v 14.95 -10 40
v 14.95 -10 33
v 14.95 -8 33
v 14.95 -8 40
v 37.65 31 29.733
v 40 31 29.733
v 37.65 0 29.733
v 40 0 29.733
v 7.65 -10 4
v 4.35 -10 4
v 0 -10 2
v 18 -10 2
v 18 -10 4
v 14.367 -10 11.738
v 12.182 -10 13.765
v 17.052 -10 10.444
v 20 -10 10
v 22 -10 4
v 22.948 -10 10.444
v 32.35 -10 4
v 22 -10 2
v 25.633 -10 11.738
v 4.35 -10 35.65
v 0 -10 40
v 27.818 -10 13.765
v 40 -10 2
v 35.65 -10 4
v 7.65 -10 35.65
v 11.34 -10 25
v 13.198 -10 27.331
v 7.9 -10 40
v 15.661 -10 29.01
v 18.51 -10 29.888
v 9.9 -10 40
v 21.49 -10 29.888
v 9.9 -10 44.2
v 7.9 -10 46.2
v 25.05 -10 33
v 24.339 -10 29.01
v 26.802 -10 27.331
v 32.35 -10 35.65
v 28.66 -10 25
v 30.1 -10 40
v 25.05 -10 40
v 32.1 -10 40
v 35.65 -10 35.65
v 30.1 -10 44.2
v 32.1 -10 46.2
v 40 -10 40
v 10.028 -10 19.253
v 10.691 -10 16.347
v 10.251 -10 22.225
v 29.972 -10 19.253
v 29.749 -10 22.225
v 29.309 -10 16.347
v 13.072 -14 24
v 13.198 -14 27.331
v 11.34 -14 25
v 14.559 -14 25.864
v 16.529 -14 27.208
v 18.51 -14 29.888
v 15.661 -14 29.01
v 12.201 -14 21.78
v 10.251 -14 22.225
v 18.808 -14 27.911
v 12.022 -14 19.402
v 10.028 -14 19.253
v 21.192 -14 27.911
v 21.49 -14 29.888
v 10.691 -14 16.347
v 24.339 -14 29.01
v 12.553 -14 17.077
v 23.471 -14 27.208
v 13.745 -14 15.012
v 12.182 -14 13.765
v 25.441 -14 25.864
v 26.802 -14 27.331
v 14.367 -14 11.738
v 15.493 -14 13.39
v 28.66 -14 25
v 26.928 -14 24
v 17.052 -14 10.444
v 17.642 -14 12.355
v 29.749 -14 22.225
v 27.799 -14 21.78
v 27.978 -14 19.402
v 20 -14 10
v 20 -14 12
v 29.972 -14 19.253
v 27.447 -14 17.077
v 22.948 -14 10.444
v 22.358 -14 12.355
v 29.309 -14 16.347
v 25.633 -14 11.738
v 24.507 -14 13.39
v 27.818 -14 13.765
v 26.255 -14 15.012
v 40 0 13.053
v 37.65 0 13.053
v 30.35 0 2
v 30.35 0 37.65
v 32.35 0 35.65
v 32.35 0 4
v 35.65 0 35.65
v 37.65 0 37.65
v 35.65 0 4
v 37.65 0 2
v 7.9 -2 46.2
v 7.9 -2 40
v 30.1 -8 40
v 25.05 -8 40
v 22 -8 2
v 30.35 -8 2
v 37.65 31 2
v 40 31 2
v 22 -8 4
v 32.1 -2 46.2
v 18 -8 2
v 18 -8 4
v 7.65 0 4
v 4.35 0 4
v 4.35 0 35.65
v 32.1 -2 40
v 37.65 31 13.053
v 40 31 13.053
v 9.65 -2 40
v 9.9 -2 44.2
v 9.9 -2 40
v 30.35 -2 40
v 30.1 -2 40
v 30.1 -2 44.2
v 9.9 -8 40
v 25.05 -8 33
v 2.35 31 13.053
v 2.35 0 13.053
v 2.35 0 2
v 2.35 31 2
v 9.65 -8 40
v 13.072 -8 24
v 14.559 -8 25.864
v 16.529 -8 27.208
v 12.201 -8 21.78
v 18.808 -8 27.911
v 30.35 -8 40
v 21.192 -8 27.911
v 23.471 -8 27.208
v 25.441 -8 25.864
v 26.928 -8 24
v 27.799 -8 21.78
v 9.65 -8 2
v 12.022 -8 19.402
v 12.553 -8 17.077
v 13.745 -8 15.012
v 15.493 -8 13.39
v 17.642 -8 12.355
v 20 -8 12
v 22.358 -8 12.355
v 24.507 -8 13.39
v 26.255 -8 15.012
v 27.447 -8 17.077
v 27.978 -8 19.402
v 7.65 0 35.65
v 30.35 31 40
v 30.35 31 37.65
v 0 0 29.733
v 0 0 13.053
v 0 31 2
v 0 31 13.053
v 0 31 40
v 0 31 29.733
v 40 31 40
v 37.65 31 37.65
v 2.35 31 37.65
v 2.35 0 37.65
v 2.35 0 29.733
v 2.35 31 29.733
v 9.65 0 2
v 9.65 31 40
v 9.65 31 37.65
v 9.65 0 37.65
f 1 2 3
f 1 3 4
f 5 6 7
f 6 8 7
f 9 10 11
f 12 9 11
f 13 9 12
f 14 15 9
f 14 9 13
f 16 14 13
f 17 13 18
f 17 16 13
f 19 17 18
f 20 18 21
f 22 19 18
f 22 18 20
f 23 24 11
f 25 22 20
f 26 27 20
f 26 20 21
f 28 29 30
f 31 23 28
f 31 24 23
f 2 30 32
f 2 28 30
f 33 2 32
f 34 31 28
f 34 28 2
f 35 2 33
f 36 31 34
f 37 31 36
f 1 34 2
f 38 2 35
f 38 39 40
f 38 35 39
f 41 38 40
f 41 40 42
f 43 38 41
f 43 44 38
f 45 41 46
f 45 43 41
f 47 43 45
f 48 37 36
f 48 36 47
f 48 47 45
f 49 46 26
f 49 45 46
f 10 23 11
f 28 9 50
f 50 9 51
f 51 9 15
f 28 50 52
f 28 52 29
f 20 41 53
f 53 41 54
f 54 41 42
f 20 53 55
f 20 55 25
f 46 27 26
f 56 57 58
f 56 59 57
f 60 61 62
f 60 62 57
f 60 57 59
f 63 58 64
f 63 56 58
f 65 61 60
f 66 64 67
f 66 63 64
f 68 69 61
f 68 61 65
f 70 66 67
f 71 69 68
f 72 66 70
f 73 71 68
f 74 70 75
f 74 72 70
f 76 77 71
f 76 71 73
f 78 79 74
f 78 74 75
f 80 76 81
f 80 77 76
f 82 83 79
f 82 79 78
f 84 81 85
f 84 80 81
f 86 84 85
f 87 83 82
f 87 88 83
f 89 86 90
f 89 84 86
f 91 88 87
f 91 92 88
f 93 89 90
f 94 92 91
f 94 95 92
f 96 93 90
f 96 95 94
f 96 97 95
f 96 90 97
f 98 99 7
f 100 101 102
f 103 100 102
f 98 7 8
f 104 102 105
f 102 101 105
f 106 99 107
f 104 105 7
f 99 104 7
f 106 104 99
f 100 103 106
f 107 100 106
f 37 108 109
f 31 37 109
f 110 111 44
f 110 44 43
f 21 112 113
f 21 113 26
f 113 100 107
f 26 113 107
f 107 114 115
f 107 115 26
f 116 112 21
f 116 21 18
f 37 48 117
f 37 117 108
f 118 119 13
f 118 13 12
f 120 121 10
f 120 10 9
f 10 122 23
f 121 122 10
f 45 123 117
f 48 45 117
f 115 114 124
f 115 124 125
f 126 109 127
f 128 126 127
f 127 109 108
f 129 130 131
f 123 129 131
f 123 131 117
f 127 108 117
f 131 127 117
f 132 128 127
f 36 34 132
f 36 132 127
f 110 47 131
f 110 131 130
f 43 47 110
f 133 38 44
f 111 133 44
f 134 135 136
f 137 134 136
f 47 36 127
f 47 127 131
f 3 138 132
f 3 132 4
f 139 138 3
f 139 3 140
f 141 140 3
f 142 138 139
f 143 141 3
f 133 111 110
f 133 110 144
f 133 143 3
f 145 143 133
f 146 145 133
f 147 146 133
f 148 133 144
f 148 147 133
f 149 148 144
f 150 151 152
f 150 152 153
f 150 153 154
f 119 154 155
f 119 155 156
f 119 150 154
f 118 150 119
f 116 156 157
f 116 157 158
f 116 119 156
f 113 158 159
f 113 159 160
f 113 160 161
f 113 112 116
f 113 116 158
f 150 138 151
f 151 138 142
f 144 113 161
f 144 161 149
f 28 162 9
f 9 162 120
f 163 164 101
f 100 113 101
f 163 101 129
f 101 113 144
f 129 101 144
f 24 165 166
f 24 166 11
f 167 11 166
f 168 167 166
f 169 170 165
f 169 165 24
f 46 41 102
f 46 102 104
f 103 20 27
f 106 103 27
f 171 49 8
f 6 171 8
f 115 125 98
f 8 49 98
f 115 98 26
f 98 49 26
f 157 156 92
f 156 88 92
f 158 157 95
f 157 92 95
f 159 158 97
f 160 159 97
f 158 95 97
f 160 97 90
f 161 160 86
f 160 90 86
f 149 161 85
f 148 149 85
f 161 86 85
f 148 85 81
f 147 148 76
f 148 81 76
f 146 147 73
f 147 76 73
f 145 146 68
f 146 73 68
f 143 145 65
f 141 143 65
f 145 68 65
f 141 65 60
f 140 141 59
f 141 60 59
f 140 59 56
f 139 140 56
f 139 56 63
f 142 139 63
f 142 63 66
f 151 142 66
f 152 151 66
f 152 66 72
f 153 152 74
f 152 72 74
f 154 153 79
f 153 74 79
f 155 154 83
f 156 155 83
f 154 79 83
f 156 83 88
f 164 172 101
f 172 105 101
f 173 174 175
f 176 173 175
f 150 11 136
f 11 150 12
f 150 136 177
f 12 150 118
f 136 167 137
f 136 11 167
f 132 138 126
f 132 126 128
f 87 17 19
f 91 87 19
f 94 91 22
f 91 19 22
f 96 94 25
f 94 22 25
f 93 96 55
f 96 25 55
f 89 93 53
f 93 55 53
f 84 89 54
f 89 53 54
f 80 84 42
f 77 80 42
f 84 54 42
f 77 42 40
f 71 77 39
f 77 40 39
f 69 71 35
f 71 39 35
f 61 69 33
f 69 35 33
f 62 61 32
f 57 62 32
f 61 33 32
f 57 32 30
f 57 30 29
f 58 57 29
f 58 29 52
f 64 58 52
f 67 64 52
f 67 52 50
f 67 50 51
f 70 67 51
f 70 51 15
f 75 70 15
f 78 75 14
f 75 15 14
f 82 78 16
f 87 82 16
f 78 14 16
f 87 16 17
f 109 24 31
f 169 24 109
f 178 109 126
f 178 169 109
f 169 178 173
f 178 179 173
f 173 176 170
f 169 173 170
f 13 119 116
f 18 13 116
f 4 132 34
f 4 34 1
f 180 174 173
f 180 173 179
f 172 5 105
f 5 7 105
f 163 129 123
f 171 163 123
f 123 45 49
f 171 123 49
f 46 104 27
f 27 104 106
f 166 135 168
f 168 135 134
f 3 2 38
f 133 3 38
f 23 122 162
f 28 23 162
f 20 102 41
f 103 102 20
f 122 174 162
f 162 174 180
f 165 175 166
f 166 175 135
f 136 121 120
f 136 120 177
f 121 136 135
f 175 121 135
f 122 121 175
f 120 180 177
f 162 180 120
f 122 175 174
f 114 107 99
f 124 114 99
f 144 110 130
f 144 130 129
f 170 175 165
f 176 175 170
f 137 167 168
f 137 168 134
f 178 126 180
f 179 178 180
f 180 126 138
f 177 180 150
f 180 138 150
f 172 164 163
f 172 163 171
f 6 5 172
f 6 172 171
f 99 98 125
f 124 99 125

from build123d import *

# Parameters (mm, degrees)
BOSS_EXTRUDE2_DEPTH = 28
SKETCH3_W           = 40
SKETCH3_H           = 38
BOSS_EXTRUDE3_DEPTH = 10
CUT_EXTRUDE2_DEPTH  = 8
SKETCH6_W           = 20.7
SKETCH6_H           = 38
CUT_EXTRUDE3_DEPTH  = 43
CUT_EXTRUDE4_DEPTH  = 43
BOSS_EXTRUDE5_DEPTH = 8
SKETCH10_R          = 10
BOSS_EXTRUDE6_DEPTH = 4
SKETCH11_R          = 8
CUT_EXTRUDE5_DEPTH  = 4
SKETCH12_R          = 8
CUT_EXTRUDE6_DEPTH  = 10
SKETCH13_W          = 3.3
SKETCH13_H          = 31.65
CUT_EXTRUDE7_DEPTH  = 10
SKETCH14_W          = 3.3
SKETCH14_H          = 31.65
CUT_EXTRUDE8_DEPTH  = 10
SKETCH15_W          = 16.679991472
SKETCH15_H          = 28
CUT_EXTRUDE9_DEPTH  = 253
SKETCH16_W          = 10.1
SKETCH16_H          = 7
CUT_EXTRUDE11_DEPTH = 13
SKETCH17_W          = 2.35
SKETCH17_H          = 11.05285785
BOSS_EXTRUDE7_DEPTH = 3


with BuildPart() as part:
    # Sketch1 → Boss-Extrude2 (new body)
    with BuildSketch(Plane(origin=(0, 0, 0), x_dir=(1, 0, 0), z_dir=(0, 1, 0))):
        Polygon((40, -2), (40, -40), (0, -40), (0, -2), (2.35, -2), (2.35, -2.35), (2.35, -20), (2.35, -37.65), (37.65, -37.65), (37.65, -20), (37.65, -2.35), (37.65, -2), align=None)
    extrude(amount=BOSS_EXTRUDE2_DEPTH)

    # Sketch3 → Boss-Extrude3 (add)
    with BuildSketch(Plane.XZ):
        with Locations((20, 21)):
            Rectangle(SKETCH3_W, SKETCH3_H)
    extrude(amount=BOSS_EXTRUDE3_DEPTH)

    # Sketch5 → Cut-Extrude2 (cut)
    with BuildSketch(Plane(origin=(0, 0, 0), x_dir=(1, 0, 0), z_dir=(0, 1, 0))):
        Polygon((9.65, -20), (9.65, -57.9), (20, -57.9), (30.35, -57.9), (30.35, -20), (30.35, -2), (9.65, -2), align=None)
    extrude(amount=-CUT_EXTRUDE2_DEPTH, mode=Mode.SUBTRACT)

    # Sketch6 → Cut-Extrude3 (cut)
    with BuildSketch(Plane(origin=(0, -8, 0), x_dir=(1, 0, 0), z_dir=(0, 1, 0))):
        with Locations((20, -21)):
            Rectangle(SKETCH6_W, SKETCH6_H)
    extrude(amount=CUT_EXTRUDE3_DEPTH, mode=Mode.SUBTRACT)

    # Sketch7 → Cut-Extrude4 (cut)
    with BuildSketch(Plane(origin=(0, -8, 0), x_dir=(1, 0, 0), z_dir=(0, 1, 0))):
        Polygon((20, -4), (18, -4), (18, -2), (22, -2), (22, -4), align=None)
    extrude(amount=-CUT_EXTRUDE4_DEPTH, mode=Mode.SUBTRACT)

    # Sketch9 → Boss-Extrude5 (add)
    with BuildSketch(Plane.XZ.offset(10)):
        Polygon((30.1, 44.2), (30.1, 40), (32.1, 40), (32.1, 46.2), (18, 46.2), (9.9, 46.2), (7.9, 46.2), (7.9, 40), (9.9, 40), (9.9, 44.2), align=None)
    extrude(amount=-BOSS_EXTRUDE5_DEPTH)

    # Sketch10 → Boss-Extrude6 (add)
    with BuildSketch(Plane.XZ.offset(10)):
        with Locations(Location((20, 20, 0), (0, 0, 270))):
            Circle(SKETCH10_R)
    extrude(amount=BOSS_EXTRUDE6_DEPTH)

    # Sketch11 → Cut-Extrude5 (cut)
    with BuildSketch(Plane(origin=(0, -14, 0), x_dir=(-1, 0, 0), z_dir=(0, -1, 0))):
        with Locations(Location((-20, -20, 0), (0, 0, 90))):
            Circle(SKETCH11_R)
    extrude(amount=-CUT_EXTRUDE5_DEPTH, mode=Mode.SUBTRACT)

    # Sketch12 → Cut-Extrude6 (cut)
    with BuildSketch(Plane.XZ.offset(10)):
        with Locations(Location((20, 20, 0), (0, 0, 270))):
            Circle(SKETCH12_R)
    extrude(amount=-CUT_EXTRUDE6_DEPTH, mode=Mode.SUBTRACT)

    # Sketch13 → Cut-Extrude7 (cut)
    with BuildSketch(Plane(origin=(0, 0, 0), x_dir=(1, 0, 0), z_dir=(0, 1, 0))):
        with Locations((6, -19.825)):
            Rectangle(SKETCH13_W, SKETCH13_H)
    extrude(amount=-CUT_EXTRUDE7_DEPTH, mode=Mode.SUBTRACT)

    # Sketch14 → Cut-Extrude8 (cut)
    with BuildSketch(Plane(origin=(0, 0, 0), x_dir=(1, 0, 0), z_dir=(0, 1, 0))):
        with Locations((34, -19.825)):
            Rectangle(SKETCH14_W, SKETCH14_H)
    extrude(amount=-CUT_EXTRUDE8_DEPTH, mode=Mode.SUBTRACT)

    # Sketch15 → Cut-Extrude9 (cut)
    with BuildSketch(Plane(origin=(40, 0, 0), x_dir=(0, 0, -1), z_dir=(1, 0, 0))):
        with Locations((-21.392853586, 14)):
            Rectangle(SKETCH15_W, SKETCH15_H)
    extrude(amount=-CUT_EXTRUDE9_DEPTH, mode=Mode.SUBTRACT)

    # Sketch16 → Cut-Extrude11 (cut)
    with BuildSketch(Plane.XZ.offset(10)):
        with Locations((20, 36.5)):
            Rectangle(SKETCH16_W, SKETCH16_H)
    extrude(amount=-CUT_EXTRUDE11_DEPTH, mode=Mode.SUBTRACT)

    # Sketch17 → Boss-Extrude7 (add)
    with BuildSketch(Plane(origin=(0, 28, 0), x_dir=(1, 0, 0), z_dir=(0, 1, 0))):
        Polygon((40, -40), (40, -29.732849322), (37.65, -29.732849322), (37.65, -37.65), (30.35, -37.65), (30.35, -40), align=None)
        Polygon((9.65, -40), (0, -40), (0, -29.732849322), (2.35, -29.732849322), (2.35, -37.65), (9.65, -37.65), align=None)
        with Locations((1.175, -7.526428925)):
            Rectangle(SKETCH17_W, SKETCH17_H)
        with Locations((38.825, -7.526428925)):
            Rectangle(SKETCH17_W, SKETCH17_H)
    extrude(amount=BOSS_EXTRUDE7_DEPTH)


solid = part.part
